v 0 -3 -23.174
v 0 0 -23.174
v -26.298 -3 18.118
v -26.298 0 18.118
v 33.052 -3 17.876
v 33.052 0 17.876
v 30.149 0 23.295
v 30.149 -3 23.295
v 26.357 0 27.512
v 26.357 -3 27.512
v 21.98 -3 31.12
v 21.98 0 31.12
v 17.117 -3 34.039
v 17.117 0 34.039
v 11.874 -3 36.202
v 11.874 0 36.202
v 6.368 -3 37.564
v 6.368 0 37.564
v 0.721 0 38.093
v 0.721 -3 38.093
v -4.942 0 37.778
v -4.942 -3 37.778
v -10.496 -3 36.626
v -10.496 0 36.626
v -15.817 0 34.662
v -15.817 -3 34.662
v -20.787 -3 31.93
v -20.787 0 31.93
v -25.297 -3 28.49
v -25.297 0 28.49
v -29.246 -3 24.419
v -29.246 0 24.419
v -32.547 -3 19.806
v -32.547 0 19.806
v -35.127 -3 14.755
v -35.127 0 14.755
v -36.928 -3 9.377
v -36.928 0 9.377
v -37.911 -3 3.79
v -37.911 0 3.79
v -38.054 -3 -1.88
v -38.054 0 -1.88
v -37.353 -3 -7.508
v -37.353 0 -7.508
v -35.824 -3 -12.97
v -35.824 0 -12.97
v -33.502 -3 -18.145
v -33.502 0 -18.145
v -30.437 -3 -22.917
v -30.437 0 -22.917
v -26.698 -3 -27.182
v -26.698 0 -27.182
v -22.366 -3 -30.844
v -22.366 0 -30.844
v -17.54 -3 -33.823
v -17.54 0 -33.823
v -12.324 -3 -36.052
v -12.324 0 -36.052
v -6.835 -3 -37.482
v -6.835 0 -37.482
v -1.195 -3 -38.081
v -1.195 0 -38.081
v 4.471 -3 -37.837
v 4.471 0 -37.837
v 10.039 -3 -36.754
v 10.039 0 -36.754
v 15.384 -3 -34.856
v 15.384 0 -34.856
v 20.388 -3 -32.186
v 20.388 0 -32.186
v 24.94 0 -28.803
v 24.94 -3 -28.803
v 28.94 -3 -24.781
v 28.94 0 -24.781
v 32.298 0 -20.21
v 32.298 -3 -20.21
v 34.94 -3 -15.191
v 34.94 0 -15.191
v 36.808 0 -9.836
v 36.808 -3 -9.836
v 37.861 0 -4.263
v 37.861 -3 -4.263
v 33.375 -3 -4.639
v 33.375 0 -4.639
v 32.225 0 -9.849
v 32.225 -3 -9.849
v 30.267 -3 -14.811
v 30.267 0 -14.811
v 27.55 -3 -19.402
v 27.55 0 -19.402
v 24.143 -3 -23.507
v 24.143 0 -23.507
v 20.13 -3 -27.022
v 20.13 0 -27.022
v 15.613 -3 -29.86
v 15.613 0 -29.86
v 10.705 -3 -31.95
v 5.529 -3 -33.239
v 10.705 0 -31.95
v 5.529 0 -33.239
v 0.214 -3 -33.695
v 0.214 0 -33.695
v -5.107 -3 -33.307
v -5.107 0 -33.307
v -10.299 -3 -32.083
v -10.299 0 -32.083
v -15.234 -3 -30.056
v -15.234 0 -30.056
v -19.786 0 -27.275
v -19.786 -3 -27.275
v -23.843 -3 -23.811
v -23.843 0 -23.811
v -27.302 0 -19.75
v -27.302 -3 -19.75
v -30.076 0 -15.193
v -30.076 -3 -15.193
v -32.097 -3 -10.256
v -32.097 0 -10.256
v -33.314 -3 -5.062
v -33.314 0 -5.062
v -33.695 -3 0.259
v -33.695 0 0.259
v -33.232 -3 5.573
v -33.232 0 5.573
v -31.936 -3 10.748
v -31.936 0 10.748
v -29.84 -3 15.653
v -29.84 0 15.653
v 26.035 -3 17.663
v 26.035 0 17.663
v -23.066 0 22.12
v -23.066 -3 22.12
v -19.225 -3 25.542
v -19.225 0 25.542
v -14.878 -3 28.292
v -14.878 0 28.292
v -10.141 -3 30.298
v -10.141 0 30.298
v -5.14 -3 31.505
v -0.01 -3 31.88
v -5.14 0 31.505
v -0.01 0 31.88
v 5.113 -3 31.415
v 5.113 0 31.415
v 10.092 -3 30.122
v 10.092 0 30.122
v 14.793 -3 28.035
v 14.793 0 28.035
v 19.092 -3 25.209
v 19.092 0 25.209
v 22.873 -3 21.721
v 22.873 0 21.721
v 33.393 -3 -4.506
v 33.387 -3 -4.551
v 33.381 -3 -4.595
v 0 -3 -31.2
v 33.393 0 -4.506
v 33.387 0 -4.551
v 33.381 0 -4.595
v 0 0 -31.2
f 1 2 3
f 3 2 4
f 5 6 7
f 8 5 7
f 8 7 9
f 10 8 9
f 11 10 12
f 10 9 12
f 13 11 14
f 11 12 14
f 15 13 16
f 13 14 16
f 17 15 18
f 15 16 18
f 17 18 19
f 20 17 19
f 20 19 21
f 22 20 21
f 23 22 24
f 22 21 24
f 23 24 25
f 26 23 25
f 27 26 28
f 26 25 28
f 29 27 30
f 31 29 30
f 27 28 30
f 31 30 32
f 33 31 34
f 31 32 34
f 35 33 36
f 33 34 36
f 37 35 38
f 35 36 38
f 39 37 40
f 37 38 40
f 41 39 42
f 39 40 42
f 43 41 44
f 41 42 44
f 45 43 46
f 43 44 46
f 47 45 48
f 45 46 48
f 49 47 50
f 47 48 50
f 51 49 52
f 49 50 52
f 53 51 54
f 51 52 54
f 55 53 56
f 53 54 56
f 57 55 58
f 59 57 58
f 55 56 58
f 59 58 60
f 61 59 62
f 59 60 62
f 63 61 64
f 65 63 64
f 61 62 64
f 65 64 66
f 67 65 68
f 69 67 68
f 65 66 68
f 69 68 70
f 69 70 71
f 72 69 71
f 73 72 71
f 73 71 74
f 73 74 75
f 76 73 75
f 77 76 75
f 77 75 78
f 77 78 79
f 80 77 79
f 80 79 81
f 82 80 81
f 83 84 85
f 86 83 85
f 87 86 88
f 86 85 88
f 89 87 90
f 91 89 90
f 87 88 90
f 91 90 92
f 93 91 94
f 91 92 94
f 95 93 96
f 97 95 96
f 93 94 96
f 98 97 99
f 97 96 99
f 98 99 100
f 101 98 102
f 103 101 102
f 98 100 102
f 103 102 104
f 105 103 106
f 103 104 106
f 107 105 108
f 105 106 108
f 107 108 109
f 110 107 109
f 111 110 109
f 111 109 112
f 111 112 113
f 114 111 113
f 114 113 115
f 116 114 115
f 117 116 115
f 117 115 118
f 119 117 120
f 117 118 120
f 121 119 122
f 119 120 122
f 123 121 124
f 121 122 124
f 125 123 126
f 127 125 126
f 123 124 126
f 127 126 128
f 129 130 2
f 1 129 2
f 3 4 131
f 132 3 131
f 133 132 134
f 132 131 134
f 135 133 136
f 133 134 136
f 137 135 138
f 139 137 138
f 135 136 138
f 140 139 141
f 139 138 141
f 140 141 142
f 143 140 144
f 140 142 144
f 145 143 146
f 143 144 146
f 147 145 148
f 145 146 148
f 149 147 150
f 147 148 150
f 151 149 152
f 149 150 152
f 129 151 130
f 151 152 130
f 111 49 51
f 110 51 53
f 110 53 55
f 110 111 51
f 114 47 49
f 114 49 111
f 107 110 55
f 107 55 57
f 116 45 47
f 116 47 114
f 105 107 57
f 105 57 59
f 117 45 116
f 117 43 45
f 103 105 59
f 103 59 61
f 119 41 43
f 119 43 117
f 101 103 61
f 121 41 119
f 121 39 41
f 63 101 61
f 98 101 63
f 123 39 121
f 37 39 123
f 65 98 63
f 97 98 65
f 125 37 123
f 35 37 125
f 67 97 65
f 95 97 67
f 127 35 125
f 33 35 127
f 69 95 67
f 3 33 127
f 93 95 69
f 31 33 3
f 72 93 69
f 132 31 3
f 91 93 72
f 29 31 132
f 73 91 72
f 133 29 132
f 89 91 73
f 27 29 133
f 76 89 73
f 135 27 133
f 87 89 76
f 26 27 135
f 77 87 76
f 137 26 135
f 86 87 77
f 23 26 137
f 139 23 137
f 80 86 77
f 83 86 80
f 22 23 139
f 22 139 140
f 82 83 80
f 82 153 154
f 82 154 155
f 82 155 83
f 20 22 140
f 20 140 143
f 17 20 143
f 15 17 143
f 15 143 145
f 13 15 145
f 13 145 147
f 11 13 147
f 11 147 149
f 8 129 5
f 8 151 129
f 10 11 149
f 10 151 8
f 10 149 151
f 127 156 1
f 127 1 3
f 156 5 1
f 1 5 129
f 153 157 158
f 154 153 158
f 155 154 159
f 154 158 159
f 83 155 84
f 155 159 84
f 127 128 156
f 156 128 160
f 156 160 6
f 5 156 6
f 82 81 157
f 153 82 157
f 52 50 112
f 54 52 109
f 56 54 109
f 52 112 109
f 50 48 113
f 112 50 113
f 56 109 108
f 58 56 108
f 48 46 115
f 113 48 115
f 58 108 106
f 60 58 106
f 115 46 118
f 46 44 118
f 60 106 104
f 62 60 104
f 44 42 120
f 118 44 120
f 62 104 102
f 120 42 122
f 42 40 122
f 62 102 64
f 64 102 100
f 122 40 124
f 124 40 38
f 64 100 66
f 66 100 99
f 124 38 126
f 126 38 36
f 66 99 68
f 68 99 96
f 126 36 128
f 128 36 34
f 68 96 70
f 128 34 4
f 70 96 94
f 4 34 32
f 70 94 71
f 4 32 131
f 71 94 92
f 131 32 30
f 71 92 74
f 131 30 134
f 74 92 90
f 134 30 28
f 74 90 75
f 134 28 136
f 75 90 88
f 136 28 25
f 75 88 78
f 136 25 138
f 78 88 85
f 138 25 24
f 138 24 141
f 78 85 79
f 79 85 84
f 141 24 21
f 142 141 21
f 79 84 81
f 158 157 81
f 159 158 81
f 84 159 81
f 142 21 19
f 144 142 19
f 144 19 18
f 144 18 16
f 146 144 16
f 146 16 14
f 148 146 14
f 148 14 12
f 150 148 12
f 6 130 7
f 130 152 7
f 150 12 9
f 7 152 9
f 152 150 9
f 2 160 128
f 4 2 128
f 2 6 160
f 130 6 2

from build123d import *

# Parameters (mm, degrees)
F1_DEPTH = 3


with BuildPart() as f1:
    # F0 (on Front) → F1 (new body)
    with BuildSketch(Plane.XZ):
        with BuildLine():
            Line((33.051588, 17.876159), (30.149128, 23.294637))
            ThreePointArc((30.149128, 23.294637), (-36.690424, -10.26756), (37.860809, -4.262528))
            Line((37.860809, -4.262528), (33.393364, -4.506392))
            ThreePointArc((33.393364, -4.506392), (33.384315, -4.572946), (33.375133, -4.639482))
            ThreePointArc((33.375133, -4.639482), (-10.299233, -32.083487), (-29.839553, 15.653286))
            Line((-29.839553, 15.653286), (0, -31.200437))
            Line((0, -31.200437), (33.051588, 17.876159))
        make_face()
        with BuildLine():
            Line((0, -23.174103), (-26.297564, 18.11803))
            ThreePointArc((-26.297564, 18.11803), (-0.009919, 31.880483), (26.034596, 17.663288))
            Line((26.034596, 17.663288), (0, -23.174103))
        make_face(mode=Mode.SUBTRACT)
    extrude(amount=F1_DEPTH)


solid = f1.part
